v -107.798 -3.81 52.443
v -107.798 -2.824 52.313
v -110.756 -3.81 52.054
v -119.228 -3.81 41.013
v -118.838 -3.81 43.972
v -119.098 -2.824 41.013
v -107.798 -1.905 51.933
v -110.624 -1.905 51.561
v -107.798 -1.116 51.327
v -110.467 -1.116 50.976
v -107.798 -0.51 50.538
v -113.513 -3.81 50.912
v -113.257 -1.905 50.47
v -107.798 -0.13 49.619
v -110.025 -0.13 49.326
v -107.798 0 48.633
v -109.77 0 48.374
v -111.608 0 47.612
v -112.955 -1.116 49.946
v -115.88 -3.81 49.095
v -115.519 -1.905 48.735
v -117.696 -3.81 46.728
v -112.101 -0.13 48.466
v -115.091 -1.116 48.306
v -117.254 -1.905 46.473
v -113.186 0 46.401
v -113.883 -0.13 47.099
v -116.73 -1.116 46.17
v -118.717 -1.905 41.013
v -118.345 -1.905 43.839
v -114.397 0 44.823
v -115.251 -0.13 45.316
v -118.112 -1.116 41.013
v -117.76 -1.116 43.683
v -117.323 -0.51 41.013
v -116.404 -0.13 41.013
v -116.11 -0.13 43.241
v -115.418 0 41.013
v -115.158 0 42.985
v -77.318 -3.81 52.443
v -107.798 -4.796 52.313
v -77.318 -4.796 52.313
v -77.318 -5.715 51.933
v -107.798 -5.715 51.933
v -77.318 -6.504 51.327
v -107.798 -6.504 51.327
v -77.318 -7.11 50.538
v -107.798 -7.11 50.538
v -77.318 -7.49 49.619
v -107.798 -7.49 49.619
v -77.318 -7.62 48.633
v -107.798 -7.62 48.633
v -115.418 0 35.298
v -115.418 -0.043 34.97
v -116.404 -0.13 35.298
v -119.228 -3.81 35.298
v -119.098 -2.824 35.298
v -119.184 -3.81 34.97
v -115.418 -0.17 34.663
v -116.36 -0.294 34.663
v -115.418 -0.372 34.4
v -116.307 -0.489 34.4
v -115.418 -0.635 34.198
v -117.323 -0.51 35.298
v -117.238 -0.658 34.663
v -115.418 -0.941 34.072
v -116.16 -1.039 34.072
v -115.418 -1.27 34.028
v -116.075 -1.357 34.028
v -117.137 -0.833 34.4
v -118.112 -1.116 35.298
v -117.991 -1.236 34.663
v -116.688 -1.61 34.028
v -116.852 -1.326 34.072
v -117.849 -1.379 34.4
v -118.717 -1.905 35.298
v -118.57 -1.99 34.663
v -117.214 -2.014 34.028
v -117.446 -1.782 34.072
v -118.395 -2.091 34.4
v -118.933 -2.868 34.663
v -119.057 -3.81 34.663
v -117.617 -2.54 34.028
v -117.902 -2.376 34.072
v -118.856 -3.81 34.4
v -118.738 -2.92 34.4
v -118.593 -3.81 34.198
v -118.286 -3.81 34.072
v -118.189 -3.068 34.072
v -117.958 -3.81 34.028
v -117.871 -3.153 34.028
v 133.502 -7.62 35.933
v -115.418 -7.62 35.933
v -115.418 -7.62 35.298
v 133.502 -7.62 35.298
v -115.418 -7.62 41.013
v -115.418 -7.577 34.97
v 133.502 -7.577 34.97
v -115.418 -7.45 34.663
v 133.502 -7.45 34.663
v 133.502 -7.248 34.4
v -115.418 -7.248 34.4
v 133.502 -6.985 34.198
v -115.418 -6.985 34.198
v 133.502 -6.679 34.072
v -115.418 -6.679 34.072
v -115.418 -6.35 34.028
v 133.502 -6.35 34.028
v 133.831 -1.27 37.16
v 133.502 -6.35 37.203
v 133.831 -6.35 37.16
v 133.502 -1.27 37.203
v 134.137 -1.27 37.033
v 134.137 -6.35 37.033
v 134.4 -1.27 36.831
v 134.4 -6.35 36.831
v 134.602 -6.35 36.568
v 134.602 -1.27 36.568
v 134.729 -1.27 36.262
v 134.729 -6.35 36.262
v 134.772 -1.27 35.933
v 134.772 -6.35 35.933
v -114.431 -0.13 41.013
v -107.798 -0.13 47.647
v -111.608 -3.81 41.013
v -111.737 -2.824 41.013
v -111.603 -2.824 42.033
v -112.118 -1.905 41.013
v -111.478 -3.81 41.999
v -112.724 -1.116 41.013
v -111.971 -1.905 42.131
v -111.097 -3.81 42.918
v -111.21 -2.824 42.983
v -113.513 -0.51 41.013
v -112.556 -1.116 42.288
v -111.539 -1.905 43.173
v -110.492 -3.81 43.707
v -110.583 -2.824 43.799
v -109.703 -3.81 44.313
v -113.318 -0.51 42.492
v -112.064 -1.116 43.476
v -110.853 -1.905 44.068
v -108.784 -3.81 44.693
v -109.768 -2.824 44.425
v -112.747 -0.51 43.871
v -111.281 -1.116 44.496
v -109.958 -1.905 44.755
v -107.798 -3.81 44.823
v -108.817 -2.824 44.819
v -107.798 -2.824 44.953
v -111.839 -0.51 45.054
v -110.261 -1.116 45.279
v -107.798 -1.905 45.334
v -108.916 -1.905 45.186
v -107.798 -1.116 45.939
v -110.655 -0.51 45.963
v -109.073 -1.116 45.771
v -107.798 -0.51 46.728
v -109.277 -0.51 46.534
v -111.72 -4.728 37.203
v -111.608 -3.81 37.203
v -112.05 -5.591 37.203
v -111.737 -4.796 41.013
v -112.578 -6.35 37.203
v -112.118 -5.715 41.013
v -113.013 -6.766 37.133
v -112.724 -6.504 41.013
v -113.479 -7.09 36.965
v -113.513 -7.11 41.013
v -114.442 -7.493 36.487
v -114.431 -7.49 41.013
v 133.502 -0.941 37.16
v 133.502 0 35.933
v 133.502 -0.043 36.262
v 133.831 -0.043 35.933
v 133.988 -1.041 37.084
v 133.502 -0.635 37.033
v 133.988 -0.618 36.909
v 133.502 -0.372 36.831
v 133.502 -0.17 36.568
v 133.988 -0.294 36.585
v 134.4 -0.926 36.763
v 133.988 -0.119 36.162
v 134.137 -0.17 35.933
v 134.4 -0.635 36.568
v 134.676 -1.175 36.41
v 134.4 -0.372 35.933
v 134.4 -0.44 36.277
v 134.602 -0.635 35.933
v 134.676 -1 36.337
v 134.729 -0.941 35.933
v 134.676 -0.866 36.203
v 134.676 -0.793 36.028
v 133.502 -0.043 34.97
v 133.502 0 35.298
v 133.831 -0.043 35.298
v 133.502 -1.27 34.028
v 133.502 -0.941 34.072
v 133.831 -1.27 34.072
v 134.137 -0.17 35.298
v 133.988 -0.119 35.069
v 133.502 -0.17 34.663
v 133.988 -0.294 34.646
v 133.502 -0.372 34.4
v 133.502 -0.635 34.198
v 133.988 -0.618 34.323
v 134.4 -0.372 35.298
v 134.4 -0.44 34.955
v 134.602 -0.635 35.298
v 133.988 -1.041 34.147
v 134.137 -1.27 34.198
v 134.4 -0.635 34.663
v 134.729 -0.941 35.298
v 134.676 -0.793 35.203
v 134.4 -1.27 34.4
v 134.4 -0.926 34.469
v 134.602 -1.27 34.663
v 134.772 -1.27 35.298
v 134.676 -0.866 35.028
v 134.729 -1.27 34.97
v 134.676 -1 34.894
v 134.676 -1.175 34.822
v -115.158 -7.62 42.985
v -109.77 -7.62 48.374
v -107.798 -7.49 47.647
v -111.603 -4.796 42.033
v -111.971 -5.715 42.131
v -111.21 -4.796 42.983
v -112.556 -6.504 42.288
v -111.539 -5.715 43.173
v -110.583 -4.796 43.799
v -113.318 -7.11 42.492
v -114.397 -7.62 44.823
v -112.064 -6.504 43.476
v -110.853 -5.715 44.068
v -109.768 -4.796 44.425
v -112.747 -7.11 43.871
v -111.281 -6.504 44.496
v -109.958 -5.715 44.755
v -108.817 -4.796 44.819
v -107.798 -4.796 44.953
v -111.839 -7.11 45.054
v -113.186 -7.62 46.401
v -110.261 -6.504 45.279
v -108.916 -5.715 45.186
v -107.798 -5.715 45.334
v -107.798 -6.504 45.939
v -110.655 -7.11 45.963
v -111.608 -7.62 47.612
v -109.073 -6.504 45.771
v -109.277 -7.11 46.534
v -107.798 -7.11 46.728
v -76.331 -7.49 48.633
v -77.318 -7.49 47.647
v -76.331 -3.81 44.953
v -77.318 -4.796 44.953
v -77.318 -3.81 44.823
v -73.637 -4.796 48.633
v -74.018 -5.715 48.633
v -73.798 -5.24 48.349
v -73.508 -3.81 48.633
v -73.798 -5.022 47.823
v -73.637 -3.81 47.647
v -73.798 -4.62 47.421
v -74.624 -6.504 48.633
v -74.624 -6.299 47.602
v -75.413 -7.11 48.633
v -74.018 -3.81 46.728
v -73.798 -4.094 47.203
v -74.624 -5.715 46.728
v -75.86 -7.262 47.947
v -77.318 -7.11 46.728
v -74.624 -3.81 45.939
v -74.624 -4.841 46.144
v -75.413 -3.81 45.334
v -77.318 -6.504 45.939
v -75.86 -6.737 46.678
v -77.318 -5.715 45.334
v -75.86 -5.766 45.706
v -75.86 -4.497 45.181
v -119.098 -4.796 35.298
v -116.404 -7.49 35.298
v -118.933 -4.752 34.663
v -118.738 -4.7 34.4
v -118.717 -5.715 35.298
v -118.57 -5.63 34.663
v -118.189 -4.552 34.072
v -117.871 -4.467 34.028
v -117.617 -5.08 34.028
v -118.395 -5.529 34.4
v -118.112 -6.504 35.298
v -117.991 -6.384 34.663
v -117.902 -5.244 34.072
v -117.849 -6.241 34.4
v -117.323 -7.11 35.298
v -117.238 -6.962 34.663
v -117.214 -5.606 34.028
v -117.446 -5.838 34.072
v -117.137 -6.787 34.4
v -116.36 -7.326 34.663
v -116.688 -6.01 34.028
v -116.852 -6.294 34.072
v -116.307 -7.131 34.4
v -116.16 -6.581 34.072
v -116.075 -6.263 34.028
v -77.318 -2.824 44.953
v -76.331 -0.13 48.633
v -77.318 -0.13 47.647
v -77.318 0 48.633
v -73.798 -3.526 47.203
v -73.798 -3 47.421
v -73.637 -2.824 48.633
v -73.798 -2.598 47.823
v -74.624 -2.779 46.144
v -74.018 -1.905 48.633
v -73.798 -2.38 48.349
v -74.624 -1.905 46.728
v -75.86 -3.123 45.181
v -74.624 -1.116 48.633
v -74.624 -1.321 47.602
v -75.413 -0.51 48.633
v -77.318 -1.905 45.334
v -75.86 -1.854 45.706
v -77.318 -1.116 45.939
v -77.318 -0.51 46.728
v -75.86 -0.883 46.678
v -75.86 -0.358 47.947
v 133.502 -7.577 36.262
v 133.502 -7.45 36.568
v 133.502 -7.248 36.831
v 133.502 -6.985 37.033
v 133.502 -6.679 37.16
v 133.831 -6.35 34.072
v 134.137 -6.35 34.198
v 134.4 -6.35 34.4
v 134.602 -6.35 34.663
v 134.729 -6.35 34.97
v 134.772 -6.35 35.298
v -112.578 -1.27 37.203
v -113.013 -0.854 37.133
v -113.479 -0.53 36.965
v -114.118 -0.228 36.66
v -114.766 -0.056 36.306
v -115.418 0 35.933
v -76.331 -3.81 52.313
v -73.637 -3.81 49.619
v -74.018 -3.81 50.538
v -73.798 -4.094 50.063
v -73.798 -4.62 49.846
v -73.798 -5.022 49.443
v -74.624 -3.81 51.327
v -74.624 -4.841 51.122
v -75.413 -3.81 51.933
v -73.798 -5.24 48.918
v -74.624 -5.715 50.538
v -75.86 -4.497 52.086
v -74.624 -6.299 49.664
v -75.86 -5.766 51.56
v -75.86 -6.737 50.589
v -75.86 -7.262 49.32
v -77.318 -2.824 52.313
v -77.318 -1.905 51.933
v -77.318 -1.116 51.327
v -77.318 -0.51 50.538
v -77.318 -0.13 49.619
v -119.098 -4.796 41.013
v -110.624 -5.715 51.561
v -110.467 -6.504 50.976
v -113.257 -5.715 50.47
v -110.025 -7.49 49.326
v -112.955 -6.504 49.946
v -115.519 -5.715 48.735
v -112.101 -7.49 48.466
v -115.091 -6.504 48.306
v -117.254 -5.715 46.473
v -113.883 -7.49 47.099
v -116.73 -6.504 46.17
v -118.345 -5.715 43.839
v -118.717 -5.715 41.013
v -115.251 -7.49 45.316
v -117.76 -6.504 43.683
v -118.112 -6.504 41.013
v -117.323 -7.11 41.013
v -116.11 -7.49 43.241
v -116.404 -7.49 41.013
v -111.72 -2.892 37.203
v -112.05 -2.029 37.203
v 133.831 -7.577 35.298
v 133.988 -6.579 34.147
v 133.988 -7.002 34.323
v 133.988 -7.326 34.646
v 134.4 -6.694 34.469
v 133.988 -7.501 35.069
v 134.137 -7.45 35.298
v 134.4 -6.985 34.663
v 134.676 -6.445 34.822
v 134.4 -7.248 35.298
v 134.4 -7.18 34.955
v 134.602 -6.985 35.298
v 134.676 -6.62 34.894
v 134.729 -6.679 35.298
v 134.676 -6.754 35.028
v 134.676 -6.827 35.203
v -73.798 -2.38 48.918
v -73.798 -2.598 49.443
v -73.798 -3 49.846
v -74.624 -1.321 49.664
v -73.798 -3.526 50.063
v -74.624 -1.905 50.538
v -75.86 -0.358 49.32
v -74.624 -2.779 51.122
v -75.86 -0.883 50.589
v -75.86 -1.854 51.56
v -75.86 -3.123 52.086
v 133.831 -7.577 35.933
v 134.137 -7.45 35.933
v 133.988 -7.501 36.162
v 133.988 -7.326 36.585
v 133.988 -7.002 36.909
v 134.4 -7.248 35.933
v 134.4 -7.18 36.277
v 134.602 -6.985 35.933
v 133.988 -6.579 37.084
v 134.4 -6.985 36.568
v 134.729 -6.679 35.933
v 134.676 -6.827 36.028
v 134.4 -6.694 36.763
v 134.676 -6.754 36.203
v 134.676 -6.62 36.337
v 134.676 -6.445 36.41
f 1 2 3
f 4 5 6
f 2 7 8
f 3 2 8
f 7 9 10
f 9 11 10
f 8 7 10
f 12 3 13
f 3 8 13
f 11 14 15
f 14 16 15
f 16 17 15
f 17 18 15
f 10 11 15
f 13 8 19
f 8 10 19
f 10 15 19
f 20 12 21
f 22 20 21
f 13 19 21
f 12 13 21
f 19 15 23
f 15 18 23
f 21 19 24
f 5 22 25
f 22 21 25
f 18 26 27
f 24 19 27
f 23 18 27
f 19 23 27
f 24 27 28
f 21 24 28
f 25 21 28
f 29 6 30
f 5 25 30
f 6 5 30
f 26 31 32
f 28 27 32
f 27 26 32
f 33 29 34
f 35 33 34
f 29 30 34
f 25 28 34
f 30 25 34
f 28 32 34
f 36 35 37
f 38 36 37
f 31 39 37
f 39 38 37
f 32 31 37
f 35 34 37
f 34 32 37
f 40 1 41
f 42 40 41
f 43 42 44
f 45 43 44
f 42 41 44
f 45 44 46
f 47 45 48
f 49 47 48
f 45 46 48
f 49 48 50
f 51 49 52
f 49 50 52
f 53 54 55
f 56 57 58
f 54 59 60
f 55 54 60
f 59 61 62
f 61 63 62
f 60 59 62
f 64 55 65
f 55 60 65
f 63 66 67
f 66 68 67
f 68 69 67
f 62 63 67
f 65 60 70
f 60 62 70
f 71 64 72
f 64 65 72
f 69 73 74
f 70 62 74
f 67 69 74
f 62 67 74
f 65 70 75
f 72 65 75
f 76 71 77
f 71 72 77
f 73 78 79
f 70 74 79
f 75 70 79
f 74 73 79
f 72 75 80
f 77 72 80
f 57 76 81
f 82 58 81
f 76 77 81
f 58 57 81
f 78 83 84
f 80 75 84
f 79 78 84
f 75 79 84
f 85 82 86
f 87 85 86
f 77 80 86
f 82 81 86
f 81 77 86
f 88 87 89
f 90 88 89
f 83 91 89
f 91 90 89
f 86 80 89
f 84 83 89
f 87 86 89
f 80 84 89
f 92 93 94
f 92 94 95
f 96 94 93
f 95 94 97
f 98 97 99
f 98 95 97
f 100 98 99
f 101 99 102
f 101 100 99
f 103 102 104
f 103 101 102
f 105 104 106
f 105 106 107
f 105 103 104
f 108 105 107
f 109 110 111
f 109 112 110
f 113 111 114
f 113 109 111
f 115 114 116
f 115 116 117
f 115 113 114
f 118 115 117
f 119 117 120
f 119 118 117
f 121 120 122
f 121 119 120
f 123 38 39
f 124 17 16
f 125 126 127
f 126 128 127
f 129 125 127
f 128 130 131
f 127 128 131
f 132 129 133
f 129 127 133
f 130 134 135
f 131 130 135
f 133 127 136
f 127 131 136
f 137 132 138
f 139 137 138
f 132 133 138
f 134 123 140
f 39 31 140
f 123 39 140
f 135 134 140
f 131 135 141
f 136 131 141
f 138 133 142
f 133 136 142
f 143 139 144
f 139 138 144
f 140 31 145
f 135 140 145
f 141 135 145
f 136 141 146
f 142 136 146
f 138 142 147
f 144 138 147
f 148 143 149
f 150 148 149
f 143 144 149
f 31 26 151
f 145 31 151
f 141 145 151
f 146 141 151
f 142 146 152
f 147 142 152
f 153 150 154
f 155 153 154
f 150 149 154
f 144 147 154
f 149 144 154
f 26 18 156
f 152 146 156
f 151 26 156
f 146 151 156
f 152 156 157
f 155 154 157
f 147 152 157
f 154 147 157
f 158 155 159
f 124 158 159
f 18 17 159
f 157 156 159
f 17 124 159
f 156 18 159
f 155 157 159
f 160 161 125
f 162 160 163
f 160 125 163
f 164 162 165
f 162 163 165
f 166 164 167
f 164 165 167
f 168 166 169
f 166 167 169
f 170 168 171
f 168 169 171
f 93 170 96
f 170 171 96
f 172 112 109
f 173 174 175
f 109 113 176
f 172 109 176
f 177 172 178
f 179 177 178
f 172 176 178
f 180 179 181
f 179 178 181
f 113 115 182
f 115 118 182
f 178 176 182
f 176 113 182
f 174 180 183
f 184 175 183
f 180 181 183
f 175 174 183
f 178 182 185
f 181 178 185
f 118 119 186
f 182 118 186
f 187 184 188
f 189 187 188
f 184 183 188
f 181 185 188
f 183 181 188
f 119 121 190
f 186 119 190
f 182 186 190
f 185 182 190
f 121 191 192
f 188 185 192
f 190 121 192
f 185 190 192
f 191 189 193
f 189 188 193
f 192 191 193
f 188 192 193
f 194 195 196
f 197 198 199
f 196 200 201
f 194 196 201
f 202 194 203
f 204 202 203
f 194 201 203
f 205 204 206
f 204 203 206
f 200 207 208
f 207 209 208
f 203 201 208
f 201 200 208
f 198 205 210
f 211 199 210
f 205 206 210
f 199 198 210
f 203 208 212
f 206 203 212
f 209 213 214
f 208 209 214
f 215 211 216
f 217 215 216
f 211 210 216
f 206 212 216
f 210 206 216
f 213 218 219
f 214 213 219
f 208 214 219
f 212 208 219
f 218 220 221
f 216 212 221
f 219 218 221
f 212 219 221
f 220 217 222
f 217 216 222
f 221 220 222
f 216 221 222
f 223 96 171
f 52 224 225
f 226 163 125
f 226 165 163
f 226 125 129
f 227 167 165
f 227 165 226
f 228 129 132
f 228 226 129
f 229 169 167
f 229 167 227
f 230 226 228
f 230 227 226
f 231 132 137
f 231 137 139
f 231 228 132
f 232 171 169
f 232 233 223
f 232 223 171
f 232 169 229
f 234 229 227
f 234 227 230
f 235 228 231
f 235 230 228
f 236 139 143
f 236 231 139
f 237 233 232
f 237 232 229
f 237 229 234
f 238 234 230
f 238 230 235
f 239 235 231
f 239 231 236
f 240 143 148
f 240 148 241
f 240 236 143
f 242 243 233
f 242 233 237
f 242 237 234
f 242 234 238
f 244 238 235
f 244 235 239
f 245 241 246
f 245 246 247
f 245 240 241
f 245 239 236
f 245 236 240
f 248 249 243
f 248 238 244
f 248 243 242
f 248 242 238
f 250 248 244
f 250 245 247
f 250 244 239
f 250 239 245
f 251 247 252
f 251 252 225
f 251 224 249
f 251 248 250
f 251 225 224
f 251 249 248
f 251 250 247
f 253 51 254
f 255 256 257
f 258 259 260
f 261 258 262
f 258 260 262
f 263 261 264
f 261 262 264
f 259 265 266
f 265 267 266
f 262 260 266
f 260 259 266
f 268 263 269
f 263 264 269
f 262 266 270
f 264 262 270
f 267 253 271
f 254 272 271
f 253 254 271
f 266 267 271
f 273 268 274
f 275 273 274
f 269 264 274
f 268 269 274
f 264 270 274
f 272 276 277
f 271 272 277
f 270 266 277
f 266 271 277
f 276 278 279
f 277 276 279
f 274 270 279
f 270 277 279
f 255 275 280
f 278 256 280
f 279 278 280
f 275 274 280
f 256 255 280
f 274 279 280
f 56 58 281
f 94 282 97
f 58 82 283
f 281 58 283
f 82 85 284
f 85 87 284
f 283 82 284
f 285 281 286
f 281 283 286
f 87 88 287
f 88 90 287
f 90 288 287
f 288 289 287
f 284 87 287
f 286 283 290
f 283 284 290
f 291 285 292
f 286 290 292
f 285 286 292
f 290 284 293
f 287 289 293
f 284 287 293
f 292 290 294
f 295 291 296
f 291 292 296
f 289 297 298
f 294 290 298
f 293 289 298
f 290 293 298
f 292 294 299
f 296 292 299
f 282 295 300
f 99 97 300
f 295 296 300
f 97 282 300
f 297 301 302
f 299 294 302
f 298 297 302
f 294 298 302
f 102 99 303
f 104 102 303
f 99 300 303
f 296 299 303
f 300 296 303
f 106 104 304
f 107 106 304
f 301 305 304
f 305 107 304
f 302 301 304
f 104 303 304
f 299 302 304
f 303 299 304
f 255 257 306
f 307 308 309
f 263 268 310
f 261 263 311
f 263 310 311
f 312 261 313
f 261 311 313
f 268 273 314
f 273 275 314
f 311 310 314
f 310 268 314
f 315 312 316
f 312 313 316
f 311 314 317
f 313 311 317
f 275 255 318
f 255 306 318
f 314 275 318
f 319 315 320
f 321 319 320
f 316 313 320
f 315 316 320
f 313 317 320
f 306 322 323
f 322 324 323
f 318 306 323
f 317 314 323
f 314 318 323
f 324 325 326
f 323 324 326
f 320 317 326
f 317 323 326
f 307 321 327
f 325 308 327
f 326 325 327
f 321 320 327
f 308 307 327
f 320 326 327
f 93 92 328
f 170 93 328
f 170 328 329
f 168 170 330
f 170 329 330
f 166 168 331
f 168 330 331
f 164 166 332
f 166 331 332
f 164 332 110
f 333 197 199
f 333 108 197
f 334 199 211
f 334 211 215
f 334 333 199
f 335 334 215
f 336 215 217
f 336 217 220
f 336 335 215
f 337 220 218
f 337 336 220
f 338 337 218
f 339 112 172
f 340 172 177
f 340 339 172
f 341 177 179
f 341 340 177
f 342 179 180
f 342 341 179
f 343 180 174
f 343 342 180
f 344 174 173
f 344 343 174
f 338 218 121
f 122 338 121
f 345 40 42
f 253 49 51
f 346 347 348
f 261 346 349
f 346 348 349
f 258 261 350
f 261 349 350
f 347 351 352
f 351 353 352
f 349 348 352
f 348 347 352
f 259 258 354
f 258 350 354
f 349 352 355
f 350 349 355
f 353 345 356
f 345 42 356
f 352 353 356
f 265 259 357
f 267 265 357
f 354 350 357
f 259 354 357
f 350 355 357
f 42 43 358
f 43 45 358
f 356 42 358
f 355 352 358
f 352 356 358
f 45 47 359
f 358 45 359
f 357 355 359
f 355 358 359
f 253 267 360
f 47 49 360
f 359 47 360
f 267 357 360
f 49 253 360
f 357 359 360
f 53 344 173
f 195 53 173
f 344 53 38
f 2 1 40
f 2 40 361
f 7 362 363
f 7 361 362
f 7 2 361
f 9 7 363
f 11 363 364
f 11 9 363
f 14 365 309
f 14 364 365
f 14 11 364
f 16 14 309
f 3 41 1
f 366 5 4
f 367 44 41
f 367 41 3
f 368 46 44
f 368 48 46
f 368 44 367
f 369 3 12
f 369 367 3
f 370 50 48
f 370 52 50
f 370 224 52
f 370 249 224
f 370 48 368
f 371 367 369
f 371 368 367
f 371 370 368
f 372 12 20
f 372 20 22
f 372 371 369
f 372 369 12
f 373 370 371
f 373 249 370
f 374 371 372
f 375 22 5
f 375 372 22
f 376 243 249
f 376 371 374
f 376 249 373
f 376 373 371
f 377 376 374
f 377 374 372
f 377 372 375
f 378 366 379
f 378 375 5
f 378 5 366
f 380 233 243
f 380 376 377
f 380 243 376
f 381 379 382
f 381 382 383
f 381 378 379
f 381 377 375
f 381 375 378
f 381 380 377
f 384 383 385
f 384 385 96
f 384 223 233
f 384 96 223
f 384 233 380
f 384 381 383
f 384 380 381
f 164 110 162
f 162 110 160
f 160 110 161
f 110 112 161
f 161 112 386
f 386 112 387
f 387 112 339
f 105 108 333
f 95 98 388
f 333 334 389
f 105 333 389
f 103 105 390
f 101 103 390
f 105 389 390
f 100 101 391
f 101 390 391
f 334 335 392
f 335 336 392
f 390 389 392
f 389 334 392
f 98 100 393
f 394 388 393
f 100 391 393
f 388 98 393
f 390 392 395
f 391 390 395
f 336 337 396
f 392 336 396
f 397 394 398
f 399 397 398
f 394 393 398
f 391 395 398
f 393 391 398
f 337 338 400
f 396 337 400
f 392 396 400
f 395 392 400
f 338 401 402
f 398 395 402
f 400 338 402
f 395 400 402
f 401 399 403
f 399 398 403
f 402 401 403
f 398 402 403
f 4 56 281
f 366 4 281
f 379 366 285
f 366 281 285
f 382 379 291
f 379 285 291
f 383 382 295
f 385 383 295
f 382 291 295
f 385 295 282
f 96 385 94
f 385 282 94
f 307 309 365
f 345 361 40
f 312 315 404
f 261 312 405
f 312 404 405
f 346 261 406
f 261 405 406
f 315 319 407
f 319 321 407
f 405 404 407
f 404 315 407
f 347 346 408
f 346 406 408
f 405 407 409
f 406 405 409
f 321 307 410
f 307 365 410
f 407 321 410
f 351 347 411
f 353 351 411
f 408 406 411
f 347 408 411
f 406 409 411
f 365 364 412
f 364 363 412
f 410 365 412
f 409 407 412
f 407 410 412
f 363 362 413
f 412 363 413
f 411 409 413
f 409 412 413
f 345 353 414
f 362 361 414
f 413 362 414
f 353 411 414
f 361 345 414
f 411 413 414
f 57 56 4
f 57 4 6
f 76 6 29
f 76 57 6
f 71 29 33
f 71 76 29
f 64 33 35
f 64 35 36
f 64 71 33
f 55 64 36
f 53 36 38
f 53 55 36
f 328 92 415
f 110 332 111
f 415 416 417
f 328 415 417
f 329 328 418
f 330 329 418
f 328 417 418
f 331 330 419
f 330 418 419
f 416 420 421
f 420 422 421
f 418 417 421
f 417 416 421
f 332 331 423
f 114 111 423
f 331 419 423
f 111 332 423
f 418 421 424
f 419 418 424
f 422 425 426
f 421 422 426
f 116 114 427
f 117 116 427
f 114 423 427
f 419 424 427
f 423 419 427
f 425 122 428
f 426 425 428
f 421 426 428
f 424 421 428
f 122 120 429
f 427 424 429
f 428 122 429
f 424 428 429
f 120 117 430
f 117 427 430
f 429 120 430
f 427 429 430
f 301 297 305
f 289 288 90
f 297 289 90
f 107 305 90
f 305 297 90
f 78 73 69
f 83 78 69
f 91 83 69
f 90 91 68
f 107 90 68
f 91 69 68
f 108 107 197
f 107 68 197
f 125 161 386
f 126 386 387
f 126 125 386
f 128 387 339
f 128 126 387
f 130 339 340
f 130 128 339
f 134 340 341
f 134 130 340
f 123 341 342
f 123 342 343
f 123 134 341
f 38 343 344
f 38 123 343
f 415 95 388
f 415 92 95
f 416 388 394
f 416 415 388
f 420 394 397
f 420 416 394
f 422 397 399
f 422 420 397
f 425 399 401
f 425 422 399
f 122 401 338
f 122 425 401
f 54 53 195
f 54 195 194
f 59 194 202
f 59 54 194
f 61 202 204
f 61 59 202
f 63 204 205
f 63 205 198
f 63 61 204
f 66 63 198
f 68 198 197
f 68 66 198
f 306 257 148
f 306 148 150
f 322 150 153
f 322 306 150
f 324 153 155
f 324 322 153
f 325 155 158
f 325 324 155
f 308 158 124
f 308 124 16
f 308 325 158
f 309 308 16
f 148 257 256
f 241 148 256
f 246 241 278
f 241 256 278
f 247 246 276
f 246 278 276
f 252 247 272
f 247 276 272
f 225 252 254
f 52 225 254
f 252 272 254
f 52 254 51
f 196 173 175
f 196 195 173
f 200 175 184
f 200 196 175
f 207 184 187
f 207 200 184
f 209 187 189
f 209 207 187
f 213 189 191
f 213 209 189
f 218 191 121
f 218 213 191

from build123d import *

# Parameters (mm, degrees)
F1_DEPTH = 7.62
F2_R     = 3.80999
F3_R     = 3.80999
F4_R     = 1.27
F5_R     = 1.27


# Not quite as in the source:
# - a fillet or chamfer is up to 0.001 mm smaller than in the source, because OpenCascade refuses the exact size


with BuildPart() as f1:
    # F0 (on Front) → F1 (new body)
    with BuildSketch(Plane.XZ):
        with BuildLine():
            Line((134.7724028379, 37.2032584392), (-111.6075971621, 37.2032584392))
            Line((-111.6075971621, 37.2032584392), (-111.6075971621, 41.0132584392))
            ThreePointArc((-111.6075971621, 41.0132584392), (-110.4916739984, 43.7073352756), (-107.7975971621, 44.8232584392))
            Line((-107.7975971621, 44.8232584392), (-73.5075971621, 44.8232584392))
            Line((-73.5075971621, 44.8232584392), (-73.5075971621, 52.4432584392))
            Line((-73.5075971621, 52.4432584392), (-107.7975971621, 52.4432584392))
            ThreePointArc((-107.7975971621, 52.4432584392), (-115.8798276711, 49.0954889482), (-119.2275971621, 41.0132584392))
            Line((-119.2275971621, 41.0132584392), (-119.2275971621, 37.2032584392))
            Line((-119.2275971621, 37.2032584392), (-119.2275971621, 34.0282584392))
            Line((-119.2275971621, 34.0282584392), (134.7724028379, 34.0282584392))
            Line((134.7724028379, 34.0282584392), (134.7724028379, 37.2032584392))
        make_face()
    extrude(amount=F1_DEPTH)

    # F2 (radius 3.81 in the source; OpenCascade refuses exactly that, so slightly less here)
    f2_edges = [f1.edges().sort_by_distance(p)[0] for p in [
        (-90.652597, -7.62, 52.443258),
        (-90.652597, -7.62, 44.823258),
        (-90.652597, 0, 44.823258),
        (-90.652597, 0, 52.443258),
    ]]
    fillet(f2_edges, radius=F2_R)

    # F3 (radius 3.81 in the source; OpenCascade refuses exactly that, so slightly less here)
    f3_edges = [f1.edges().sort_by_distance(p)[0] for p in [
        (-73.507597, -3.81, 52.443258),
        (-73.507597, -1.11592, 51.327338),
        (-73.507597, 0, 48.633258),
        (-73.507597, -1.11592, 45.939179),
        (-73.507597, -3.81, 44.823258),
        (-73.507597, -6.50408, 45.939179),
        (-73.507597, -6.50408, 51.327338),
        (-73.507597, -7.62, 48.633258),
    ]]
    fillet(f3_edges, radius=F3_R)

    # F4
    f4_edges = [f1.edges().sort_by_distance(p)[0] for p in [
        (11.582403, -7.62, 37.203258),
        (9.677398, -7.62, 34.028258),
        (11.582403, 0, 37.203258),
        (9.677398, 0, 34.028258),
    ]]
    fillet(f4_edges, radius=F4_R)

    # F5
    f5_edges = [f1.edges().sort_by_distance(p)[0] for p in [
        (134.772403, -7.248026, 36.831284),
        (134.772403, -7.62, 35.615758),
        (134.772403, -7.248026, 34.400233),
        (134.772403, -3.81, 34.028258),
        (134.772403, -0.371974, 34.400233),
        (134.772403, 0, 35.615758),
        (134.772403, -3.81, 37.203258),
        (134.772403, -0.371974, 36.831284),
    ]]
    fillet(f5_edges, radius=F5_R)


solid = f1.part
